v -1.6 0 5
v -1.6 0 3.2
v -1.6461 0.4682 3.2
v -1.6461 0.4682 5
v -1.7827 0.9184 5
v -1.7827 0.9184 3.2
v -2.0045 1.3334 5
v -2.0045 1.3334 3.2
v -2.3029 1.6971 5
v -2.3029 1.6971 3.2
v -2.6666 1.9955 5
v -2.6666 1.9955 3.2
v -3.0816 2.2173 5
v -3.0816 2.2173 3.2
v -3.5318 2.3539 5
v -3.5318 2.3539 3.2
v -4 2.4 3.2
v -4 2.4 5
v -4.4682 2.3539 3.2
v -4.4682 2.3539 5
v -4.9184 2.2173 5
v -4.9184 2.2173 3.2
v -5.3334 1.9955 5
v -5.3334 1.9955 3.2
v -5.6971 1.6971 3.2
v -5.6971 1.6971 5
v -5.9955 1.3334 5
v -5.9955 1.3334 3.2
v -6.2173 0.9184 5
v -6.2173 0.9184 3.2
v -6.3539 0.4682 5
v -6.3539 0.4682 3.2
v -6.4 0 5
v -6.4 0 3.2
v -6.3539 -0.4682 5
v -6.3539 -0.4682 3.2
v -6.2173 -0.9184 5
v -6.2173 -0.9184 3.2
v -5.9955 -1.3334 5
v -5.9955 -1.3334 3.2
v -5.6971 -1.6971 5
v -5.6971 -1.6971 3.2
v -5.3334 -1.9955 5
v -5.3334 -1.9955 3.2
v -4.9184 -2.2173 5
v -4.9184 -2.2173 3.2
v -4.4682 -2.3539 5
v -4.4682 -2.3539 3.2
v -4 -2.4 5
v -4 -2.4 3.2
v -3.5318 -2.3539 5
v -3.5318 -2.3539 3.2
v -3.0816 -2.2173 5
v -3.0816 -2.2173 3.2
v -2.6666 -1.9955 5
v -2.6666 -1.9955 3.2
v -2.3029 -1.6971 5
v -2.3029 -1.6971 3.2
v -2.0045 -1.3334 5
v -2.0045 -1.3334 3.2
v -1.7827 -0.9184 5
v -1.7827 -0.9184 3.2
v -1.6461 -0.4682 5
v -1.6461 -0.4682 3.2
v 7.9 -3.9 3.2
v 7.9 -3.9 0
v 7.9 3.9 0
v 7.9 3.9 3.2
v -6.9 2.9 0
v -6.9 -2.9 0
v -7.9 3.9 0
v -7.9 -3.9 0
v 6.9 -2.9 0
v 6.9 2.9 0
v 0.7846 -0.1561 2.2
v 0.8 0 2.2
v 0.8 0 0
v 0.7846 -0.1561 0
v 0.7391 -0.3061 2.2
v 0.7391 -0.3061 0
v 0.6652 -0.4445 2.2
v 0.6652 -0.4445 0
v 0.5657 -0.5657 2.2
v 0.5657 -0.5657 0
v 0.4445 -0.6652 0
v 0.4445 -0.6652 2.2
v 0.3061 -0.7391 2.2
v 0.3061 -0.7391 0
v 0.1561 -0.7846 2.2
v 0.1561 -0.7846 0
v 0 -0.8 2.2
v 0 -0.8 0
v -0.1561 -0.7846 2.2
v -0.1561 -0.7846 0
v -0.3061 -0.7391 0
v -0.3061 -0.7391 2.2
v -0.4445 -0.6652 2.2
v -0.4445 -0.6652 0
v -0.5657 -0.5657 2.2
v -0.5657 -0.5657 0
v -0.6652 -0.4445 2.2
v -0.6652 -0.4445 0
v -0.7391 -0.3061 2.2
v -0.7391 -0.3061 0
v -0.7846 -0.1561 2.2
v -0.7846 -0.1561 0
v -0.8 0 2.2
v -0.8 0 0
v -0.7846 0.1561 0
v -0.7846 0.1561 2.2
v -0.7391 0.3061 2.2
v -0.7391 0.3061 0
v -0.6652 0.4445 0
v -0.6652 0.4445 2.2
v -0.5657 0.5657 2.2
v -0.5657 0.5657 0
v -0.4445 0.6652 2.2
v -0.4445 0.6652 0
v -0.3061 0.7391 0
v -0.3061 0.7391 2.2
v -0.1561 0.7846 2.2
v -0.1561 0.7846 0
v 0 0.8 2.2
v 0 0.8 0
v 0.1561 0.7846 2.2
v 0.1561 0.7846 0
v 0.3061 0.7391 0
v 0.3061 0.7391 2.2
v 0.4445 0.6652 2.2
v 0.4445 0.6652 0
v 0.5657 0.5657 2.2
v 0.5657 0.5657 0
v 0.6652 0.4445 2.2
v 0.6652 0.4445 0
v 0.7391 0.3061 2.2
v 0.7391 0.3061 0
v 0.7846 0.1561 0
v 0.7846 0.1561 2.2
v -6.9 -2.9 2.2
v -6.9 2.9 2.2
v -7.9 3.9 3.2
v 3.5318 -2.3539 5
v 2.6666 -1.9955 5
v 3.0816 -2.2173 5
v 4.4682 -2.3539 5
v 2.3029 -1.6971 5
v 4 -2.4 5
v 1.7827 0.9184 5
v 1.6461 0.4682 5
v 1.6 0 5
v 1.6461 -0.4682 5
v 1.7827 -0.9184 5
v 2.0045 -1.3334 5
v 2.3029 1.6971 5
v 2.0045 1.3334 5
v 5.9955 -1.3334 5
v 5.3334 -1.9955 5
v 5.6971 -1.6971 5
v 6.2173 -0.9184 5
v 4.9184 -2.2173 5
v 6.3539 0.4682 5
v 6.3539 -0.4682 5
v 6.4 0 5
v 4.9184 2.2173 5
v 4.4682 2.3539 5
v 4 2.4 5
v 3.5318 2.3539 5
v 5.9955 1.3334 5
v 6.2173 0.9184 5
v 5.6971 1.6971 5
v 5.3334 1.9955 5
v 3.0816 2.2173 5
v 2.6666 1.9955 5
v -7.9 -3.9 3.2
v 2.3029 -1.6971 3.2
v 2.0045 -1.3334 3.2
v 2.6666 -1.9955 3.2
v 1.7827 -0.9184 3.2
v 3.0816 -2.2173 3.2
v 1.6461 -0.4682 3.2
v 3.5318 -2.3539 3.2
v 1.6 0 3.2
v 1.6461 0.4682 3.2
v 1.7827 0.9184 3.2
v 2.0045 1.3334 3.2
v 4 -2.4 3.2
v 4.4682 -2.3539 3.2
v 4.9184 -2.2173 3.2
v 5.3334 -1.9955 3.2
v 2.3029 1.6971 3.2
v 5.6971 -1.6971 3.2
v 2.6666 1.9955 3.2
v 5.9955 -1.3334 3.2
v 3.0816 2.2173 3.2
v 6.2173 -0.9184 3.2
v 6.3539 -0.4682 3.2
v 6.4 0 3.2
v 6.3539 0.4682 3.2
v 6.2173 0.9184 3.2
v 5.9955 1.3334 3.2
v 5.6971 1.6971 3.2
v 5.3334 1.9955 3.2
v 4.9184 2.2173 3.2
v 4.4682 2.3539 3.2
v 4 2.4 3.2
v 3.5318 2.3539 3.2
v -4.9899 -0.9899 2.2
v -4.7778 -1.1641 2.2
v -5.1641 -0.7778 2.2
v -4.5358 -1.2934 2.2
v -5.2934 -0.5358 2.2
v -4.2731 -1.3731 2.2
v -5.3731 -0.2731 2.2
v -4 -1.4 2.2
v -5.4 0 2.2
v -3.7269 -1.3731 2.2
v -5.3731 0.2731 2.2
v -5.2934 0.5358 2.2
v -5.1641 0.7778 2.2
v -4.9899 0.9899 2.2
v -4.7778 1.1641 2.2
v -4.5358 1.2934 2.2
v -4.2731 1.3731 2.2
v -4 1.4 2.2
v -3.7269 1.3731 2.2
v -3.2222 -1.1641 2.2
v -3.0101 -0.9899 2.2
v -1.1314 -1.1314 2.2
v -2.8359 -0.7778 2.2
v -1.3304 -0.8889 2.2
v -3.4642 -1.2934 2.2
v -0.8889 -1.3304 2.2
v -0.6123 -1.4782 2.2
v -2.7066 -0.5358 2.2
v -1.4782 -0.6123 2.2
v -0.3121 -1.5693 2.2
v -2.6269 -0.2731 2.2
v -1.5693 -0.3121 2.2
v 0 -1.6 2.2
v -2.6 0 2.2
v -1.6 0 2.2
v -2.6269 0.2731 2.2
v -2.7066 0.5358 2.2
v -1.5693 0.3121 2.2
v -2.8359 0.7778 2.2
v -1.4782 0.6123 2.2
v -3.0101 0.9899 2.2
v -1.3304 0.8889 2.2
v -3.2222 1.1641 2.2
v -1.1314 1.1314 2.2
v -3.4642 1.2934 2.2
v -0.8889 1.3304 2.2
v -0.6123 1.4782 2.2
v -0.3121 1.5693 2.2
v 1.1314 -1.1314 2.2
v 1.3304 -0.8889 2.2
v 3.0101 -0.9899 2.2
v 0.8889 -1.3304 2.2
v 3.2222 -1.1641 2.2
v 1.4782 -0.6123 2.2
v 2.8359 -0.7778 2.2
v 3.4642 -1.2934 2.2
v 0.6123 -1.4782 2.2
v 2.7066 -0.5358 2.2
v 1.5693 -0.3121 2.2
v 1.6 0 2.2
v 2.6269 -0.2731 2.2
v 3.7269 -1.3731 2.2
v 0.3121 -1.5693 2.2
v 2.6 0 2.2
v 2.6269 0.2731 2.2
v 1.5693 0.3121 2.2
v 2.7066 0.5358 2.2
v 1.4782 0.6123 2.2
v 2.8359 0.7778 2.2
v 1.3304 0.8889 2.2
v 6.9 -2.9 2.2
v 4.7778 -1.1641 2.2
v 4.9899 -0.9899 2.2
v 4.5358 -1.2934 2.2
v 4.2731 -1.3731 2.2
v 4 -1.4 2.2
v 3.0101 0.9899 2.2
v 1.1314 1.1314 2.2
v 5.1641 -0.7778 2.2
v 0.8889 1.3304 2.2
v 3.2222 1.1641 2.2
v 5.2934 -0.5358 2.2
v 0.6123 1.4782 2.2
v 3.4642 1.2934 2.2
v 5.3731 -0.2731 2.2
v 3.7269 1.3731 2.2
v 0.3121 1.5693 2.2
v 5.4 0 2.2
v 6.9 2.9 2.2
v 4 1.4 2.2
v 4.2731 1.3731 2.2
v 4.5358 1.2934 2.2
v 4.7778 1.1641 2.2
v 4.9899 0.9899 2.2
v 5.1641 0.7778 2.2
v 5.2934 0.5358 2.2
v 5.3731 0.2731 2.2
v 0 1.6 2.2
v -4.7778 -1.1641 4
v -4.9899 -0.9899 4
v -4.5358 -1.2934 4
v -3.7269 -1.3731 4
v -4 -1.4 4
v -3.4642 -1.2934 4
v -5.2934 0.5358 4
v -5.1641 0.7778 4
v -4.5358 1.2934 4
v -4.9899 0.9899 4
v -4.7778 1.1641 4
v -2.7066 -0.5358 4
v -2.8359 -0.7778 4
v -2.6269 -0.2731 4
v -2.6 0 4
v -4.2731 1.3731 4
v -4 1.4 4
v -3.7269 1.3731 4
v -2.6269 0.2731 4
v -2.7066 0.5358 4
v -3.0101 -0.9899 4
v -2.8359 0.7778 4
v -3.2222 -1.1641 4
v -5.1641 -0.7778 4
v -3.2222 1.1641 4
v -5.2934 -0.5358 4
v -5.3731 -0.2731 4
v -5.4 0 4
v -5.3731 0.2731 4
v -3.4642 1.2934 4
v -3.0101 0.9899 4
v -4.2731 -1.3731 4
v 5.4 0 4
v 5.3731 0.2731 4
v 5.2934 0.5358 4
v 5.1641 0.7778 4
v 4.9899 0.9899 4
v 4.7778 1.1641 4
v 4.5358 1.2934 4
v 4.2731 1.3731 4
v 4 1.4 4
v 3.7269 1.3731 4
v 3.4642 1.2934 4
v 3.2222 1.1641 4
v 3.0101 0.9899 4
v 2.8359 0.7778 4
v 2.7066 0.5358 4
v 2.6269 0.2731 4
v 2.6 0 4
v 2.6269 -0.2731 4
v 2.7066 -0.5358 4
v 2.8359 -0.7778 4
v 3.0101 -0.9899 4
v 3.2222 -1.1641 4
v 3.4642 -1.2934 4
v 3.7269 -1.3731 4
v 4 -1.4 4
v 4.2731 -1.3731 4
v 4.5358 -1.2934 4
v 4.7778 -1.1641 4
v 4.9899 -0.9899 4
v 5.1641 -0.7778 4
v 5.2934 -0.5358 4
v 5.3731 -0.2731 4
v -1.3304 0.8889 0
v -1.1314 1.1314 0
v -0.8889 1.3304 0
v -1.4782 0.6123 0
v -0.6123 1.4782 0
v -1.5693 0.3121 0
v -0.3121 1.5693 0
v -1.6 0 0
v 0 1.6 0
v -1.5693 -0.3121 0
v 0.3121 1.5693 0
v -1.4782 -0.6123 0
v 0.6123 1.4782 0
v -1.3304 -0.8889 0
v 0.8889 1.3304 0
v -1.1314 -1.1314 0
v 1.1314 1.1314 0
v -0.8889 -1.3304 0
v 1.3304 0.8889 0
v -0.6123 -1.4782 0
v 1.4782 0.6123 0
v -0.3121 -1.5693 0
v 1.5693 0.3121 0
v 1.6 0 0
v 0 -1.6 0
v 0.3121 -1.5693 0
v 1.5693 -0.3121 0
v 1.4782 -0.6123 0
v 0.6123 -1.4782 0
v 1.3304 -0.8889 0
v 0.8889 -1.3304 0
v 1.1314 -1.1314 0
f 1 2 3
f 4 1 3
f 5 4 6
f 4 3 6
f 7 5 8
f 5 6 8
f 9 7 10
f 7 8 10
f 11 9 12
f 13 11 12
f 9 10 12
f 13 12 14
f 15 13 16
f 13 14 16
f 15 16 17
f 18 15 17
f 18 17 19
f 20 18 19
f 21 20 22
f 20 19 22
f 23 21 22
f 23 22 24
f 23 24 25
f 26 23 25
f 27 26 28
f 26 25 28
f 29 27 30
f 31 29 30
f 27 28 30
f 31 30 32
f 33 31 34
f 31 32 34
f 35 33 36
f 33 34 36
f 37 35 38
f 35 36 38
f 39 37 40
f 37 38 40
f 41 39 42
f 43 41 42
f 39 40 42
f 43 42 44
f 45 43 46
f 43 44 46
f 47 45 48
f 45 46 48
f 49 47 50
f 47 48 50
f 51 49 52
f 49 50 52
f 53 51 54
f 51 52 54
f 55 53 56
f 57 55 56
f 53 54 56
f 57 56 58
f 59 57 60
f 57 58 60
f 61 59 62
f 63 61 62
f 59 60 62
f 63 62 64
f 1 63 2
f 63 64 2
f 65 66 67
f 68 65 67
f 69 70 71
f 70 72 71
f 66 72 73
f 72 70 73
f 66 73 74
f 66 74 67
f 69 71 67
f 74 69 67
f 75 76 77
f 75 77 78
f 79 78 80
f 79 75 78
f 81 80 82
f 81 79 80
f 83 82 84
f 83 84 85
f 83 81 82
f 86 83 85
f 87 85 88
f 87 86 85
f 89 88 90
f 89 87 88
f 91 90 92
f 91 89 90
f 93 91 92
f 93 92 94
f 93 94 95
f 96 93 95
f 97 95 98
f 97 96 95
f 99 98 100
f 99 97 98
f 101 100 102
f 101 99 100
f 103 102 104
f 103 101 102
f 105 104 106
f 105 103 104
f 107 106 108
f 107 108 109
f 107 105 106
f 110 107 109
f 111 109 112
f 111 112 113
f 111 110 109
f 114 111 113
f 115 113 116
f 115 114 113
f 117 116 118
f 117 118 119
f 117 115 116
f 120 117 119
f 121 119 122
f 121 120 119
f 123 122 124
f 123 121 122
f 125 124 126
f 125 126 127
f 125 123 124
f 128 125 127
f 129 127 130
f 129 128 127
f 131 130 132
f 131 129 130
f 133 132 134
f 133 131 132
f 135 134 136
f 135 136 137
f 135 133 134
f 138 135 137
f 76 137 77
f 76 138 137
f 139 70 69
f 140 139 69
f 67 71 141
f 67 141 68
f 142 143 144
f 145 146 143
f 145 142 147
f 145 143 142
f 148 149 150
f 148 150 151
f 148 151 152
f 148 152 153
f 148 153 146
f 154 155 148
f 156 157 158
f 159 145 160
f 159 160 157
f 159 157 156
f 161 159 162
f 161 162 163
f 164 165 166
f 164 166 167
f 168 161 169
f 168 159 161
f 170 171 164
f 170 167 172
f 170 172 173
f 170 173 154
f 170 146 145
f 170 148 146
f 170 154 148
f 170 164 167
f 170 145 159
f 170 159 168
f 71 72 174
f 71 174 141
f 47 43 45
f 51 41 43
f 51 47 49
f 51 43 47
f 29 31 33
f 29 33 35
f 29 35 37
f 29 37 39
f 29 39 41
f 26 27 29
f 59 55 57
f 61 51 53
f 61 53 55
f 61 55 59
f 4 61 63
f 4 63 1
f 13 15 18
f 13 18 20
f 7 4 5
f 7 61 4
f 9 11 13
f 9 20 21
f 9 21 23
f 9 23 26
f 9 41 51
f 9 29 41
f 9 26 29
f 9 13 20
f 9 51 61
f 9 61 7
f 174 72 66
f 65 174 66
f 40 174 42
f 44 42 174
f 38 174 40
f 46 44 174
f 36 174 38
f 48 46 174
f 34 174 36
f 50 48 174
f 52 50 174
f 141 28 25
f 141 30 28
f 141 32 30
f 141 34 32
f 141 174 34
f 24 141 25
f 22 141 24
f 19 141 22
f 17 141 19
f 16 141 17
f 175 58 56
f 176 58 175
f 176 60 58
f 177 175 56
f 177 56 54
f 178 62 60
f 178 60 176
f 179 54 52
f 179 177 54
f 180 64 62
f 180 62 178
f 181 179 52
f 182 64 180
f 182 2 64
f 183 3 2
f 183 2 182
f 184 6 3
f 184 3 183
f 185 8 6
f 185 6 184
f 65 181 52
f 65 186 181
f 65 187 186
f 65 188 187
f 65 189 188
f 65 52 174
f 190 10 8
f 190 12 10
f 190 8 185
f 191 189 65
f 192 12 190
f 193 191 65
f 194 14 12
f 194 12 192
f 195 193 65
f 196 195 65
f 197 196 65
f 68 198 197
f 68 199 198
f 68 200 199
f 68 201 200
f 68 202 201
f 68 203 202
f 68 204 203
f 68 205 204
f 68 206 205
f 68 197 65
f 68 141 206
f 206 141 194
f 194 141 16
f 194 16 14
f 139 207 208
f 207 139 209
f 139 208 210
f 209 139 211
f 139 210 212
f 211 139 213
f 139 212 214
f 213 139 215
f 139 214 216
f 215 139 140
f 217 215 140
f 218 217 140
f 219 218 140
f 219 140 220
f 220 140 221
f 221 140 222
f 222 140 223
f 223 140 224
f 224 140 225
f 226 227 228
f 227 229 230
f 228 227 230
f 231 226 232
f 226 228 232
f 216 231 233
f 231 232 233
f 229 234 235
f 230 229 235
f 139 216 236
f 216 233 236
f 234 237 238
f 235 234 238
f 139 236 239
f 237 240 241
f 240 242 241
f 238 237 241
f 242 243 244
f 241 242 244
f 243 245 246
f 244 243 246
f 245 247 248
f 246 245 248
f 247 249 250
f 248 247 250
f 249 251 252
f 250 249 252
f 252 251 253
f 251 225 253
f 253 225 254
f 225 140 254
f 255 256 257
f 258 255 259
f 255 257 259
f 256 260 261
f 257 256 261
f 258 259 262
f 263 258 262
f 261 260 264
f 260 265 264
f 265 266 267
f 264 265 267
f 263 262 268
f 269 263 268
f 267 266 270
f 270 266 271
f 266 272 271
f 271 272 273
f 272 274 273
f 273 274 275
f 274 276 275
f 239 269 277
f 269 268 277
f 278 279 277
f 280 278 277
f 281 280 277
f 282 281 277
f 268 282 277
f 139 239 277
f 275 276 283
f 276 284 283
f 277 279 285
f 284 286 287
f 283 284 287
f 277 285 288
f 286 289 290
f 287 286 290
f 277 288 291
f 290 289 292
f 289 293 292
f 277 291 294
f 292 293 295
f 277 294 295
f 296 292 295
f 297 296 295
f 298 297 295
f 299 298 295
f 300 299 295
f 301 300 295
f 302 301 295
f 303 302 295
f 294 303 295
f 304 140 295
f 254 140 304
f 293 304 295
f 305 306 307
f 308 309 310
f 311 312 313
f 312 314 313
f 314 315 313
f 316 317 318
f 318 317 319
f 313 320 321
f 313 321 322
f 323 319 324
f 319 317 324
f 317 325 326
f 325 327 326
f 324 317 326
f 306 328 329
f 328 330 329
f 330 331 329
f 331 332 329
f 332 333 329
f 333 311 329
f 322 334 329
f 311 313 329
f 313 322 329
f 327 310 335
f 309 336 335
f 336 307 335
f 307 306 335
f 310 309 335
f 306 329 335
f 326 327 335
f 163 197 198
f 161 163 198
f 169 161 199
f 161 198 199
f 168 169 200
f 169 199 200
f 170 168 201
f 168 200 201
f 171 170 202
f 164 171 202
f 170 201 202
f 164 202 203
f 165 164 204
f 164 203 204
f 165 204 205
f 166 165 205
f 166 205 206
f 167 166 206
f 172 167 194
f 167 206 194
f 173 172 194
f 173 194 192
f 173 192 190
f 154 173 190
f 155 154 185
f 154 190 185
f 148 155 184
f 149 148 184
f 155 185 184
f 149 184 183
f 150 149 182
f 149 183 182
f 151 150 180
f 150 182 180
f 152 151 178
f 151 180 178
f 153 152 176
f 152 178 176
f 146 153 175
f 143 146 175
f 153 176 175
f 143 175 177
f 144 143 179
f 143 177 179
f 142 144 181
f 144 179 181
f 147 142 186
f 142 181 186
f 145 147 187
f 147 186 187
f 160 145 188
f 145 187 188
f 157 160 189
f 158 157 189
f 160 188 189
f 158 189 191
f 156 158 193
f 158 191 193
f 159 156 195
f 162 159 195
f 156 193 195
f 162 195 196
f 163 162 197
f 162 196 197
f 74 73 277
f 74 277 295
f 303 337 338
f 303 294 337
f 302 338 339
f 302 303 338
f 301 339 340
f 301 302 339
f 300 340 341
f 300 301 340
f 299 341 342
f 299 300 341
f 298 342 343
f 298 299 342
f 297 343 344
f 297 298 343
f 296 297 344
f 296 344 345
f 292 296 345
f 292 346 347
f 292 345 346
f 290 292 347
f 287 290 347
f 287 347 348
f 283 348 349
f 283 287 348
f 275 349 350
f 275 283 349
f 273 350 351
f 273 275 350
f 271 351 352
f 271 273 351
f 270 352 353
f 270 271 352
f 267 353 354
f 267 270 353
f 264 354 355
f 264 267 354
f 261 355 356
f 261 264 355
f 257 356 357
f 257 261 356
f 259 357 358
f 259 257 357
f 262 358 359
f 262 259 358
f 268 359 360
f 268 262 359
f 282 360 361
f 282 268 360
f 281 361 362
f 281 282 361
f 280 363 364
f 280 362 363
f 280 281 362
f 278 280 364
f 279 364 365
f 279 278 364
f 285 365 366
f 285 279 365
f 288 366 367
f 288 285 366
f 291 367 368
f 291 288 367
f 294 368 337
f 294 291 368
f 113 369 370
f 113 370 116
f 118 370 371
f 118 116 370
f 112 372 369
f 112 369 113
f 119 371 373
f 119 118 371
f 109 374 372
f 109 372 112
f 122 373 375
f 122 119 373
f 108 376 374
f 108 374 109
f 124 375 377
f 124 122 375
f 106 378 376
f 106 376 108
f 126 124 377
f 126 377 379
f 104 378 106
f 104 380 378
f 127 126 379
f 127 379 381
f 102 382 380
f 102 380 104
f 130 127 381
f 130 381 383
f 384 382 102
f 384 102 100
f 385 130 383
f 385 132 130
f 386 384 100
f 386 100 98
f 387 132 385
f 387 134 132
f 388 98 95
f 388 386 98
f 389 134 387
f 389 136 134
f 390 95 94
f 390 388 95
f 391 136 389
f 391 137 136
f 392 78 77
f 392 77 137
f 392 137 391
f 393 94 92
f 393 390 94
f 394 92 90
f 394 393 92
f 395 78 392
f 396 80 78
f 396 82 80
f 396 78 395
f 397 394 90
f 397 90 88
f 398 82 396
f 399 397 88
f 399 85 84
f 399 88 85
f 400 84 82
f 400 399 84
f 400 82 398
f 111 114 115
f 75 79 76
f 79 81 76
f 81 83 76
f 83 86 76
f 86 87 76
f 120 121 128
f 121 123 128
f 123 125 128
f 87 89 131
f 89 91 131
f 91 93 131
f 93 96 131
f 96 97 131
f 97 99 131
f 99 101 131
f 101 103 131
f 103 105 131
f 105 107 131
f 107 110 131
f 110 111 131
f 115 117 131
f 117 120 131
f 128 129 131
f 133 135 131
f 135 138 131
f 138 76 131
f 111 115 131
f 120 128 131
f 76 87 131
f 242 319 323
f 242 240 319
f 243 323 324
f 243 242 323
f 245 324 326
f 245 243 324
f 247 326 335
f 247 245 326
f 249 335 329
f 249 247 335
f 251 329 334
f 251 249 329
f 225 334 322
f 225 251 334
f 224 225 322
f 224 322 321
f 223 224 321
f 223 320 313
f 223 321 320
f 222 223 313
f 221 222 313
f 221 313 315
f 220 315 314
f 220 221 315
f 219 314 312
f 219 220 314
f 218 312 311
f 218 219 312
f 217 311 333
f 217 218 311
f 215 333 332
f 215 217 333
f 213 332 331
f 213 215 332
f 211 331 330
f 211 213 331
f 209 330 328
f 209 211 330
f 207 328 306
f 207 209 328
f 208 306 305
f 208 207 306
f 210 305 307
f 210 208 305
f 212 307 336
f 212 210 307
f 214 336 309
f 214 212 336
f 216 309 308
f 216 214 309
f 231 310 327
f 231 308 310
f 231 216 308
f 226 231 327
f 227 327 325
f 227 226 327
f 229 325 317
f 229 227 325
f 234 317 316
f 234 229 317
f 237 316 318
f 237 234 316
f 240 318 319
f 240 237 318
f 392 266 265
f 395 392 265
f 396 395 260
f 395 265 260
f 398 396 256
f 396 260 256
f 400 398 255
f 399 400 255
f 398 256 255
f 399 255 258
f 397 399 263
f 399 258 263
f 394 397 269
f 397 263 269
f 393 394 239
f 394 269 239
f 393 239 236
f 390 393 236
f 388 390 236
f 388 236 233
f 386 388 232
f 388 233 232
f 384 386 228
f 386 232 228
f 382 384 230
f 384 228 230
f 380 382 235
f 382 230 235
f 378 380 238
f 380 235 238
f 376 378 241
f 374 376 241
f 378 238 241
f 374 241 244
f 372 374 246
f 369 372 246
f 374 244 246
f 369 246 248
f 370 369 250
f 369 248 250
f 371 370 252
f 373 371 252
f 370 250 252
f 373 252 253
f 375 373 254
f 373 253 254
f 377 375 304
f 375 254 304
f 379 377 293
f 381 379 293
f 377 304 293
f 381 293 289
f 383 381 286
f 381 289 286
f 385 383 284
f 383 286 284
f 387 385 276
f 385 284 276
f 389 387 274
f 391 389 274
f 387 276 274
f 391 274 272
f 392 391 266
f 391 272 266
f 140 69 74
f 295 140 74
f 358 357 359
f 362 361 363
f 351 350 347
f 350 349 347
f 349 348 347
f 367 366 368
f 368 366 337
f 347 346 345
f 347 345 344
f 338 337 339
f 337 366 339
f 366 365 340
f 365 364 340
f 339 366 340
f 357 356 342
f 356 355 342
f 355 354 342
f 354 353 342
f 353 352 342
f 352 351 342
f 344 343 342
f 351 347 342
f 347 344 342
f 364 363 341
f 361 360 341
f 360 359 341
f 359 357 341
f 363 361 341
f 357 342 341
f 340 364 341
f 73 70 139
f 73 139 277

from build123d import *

# Parameters (mm, degrees)
F0_W     = 15.8
F0_H     = 7.8
F1_DEPTH = 3.2
F2_R     = 2.4
F3_DEPTH = 1.8
F4_T     = -1
F5_R     = 1.6
F5_R_2   = 0.8
F6_DEPTH = 2.2


with BuildPart() as f1:
    # F0 (on Top) → F1 (new body)
    with BuildSketch(Plane.XY):
        Rectangle(F0_W, F0_H)
    extrude(amount=F1_DEPTH)

    # F2 (on face) → F3 (join)
    with BuildSketch(Plane.XY.offset(3.2)):
        with Locations((-4, 0)):
            Circle(F2_R)
        with Locations((4, 0)):
            Circle(F2_R)
    extrude(amount=F3_DEPTH)

    # F4
    f4_openings = [f1.faces().sort_by_distance(p)[0] for p in [
        (0, 0, 0),
    ]]
    offset(amount=F4_T, openings=f4_openings, kind=Kind.INTERSECTION)

    # F5 (on face) → F6 (join, through all)
    with BuildSketch(Plane(origin=(0, 0, 2.2), x_dir=(1, 0, 0), z_dir=(0, 0, -1))):
        Circle(F5_R)
        Circle(F5_R_2, mode=Mode.SUBTRACT)
    extrude(amount=F6_DEPTH)


solid = f1.part
